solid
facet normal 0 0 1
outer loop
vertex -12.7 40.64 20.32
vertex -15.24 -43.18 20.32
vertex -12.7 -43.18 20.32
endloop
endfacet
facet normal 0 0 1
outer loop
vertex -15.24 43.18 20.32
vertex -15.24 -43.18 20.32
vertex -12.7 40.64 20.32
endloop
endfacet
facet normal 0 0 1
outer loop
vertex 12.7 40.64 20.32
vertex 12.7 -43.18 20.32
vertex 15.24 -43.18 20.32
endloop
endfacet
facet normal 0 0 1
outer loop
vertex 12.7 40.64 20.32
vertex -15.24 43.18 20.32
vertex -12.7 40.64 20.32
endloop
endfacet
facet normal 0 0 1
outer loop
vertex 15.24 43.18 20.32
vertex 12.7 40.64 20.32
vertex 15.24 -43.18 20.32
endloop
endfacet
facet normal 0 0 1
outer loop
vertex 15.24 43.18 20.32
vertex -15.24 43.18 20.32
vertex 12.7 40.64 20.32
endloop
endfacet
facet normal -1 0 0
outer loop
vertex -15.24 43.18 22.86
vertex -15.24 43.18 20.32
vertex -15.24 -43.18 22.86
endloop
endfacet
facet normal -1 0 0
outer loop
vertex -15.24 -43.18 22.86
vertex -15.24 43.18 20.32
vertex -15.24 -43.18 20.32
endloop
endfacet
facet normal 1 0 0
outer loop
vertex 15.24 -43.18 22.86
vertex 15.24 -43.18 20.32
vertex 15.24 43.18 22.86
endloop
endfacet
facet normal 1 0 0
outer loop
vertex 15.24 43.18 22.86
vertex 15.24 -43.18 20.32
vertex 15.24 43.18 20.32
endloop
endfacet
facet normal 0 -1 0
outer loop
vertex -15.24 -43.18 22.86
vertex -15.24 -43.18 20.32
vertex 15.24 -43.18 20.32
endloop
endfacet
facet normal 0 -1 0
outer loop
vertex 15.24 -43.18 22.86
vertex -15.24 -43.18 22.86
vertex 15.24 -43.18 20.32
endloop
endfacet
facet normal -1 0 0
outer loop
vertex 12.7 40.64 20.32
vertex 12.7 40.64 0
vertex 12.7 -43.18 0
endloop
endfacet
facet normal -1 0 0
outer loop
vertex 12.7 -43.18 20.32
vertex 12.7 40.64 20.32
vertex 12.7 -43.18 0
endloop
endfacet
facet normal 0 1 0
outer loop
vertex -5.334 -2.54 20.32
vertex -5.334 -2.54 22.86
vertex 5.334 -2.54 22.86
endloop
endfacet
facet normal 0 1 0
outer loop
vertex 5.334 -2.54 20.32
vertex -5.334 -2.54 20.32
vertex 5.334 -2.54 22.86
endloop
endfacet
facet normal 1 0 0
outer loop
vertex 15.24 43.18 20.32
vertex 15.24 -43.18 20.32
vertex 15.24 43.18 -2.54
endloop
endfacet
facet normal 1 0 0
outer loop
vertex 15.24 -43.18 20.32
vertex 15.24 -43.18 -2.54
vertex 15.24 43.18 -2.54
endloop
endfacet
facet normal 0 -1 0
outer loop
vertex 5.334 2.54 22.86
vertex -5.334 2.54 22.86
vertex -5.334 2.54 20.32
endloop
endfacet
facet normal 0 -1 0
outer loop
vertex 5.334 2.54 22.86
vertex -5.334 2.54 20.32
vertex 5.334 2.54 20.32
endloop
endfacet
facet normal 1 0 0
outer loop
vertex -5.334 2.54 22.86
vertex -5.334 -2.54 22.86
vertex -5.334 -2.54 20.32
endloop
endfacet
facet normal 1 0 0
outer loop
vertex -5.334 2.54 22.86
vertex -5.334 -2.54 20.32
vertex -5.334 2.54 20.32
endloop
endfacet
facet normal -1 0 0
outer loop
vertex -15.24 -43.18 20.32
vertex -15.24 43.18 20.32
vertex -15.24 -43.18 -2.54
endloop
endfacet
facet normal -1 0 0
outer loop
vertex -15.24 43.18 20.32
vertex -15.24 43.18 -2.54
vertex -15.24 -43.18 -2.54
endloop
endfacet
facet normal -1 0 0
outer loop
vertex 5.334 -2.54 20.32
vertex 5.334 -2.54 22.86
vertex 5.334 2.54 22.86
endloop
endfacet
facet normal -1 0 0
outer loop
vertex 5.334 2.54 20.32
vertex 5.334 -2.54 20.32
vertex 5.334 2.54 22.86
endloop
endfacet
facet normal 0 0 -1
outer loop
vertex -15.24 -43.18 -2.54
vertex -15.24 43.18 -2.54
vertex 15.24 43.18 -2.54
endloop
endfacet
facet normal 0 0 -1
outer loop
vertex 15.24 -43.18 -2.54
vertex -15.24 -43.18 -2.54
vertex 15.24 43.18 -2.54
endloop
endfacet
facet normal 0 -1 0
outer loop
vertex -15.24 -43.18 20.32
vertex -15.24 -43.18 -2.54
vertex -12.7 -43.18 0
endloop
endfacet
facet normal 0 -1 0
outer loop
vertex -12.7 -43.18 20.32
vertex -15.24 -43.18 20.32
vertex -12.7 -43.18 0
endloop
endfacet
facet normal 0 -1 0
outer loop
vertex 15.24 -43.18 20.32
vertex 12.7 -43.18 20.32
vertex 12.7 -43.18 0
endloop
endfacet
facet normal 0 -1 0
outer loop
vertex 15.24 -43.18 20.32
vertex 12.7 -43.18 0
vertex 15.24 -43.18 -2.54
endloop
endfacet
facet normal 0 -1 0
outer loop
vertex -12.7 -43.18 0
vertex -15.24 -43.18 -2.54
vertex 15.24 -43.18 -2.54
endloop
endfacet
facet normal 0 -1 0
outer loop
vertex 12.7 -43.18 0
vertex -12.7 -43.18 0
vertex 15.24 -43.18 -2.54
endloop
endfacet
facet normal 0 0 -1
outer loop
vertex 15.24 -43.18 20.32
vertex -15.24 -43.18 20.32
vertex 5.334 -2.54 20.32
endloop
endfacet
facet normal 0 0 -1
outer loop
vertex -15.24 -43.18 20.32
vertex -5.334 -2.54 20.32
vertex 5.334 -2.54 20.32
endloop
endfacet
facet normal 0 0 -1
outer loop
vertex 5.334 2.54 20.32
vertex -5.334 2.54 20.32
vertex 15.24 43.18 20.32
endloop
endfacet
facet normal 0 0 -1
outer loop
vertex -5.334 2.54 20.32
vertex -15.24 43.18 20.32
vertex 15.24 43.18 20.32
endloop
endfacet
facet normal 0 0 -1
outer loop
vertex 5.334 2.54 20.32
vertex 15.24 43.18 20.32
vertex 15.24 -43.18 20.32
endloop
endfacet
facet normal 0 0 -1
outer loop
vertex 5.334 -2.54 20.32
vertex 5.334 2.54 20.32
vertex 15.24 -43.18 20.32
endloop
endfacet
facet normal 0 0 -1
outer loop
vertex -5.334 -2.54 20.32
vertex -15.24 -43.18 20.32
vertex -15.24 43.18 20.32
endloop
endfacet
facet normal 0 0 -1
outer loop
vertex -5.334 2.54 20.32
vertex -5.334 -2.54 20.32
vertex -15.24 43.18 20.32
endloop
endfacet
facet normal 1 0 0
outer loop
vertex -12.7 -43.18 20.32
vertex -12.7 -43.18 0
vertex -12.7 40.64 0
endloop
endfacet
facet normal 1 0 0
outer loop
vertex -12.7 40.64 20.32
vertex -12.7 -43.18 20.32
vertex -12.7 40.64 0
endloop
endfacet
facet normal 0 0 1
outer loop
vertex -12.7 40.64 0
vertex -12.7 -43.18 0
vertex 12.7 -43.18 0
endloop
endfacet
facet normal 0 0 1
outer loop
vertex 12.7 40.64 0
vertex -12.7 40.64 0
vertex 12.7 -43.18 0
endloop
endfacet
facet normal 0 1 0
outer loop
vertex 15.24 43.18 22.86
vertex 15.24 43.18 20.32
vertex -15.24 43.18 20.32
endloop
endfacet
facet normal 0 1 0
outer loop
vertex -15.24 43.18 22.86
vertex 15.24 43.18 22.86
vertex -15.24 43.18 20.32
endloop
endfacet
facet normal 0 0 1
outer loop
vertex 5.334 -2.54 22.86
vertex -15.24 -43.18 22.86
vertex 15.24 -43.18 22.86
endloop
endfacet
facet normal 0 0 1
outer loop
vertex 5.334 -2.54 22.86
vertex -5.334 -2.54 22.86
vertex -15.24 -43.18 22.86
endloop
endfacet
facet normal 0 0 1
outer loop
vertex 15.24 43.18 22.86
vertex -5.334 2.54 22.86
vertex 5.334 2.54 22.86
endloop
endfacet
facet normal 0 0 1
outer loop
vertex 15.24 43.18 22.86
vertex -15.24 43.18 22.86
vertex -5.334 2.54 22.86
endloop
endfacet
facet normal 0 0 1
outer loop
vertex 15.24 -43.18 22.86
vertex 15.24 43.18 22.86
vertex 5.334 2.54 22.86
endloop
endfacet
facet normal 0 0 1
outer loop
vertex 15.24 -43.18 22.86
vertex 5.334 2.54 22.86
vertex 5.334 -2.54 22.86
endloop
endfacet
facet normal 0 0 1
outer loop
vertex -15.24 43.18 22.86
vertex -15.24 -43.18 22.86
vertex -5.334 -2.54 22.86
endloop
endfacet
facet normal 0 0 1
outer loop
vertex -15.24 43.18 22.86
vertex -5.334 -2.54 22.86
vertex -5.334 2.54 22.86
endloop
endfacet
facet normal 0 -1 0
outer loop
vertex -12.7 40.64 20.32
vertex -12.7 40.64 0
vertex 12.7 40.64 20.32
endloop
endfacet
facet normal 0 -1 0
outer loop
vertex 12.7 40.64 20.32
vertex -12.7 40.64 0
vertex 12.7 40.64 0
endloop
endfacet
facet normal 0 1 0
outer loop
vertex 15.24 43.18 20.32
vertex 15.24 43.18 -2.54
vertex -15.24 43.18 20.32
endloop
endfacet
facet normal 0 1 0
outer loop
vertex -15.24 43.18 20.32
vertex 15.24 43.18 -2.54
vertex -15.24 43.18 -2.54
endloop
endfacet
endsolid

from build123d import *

# Parameters (mm, degrees)
F0_W     = 25.4
F0_H     = 2.54
F0_H_2   = 81.28
F1_DEPTH = 2.54
F2_DEPTH = 20.32
F3_START = 20.32
F3_DEPTH = 2.54
F4_W     = 10.668
F4_H     = 5.08
F5_DEPTH = 5.08


with BuildPart() as f1:
    # F0 (on Top) → F1 (new body)
    with BuildSketch(Plane.XY):
        Polygon((-12.7, 40.64), (12.7, 40.64), (12.7, -40.64), (12.7, -43.18), (15.24, -43.18), (15.24, 43.18), (-15.24, 43.18), (-15.24, -43.18), (-12.7, -43.18), (-12.7, -40.64), align=None)
        with Locations((0, -41.91)):
            Rectangle(F0_W, F0_H)
        Rectangle(F0_W, F0_H_2)
    extrude(amount=-F1_DEPTH)

    # F0 (on Top) → F2 (join)
    with BuildSketch(Plane.XY):
        Polygon((-12.7, 40.64), (12.7, 40.64), (12.7, -40.64), (12.7, -43.18), (15.24, -43.18), (15.24, 43.18), (-15.24, 43.18), (-15.24, -43.18), (-12.7, -43.18), (-12.7, -40.64), align=None)
    extrude(amount=F2_DEPTH)


with BuildPart() as f3:
    # F0 (on Top) → F3 (new body)
    with BuildSketch(Plane.XY.offset(F3_START)):
        Rectangle(F0_W, F0_H_2)
        Polygon((-12.7, 40.64), (12.7, 40.64), (12.7, -40.64), (12.7, -43.18), (15.24, -43.18), (15.24, 43.18), (-15.24, 43.18), (-15.24, -43.18), (-12.7, -43.18), (-12.7, -40.64), align=None)
        with Locations((0, -41.91)):
            Rectangle(F0_W, F0_H)
    extrude(amount=F3_DEPTH)

    # F4 (on face) → F5 (cut)
    with BuildSketch(Plane.XY.offset(22.86)):
        Rectangle(F4_W, F4_H)
    extrude(amount=-F5_DEPTH, mode=Mode.SUBTRACT)


solid = Compound([f1.part, f3.part])
